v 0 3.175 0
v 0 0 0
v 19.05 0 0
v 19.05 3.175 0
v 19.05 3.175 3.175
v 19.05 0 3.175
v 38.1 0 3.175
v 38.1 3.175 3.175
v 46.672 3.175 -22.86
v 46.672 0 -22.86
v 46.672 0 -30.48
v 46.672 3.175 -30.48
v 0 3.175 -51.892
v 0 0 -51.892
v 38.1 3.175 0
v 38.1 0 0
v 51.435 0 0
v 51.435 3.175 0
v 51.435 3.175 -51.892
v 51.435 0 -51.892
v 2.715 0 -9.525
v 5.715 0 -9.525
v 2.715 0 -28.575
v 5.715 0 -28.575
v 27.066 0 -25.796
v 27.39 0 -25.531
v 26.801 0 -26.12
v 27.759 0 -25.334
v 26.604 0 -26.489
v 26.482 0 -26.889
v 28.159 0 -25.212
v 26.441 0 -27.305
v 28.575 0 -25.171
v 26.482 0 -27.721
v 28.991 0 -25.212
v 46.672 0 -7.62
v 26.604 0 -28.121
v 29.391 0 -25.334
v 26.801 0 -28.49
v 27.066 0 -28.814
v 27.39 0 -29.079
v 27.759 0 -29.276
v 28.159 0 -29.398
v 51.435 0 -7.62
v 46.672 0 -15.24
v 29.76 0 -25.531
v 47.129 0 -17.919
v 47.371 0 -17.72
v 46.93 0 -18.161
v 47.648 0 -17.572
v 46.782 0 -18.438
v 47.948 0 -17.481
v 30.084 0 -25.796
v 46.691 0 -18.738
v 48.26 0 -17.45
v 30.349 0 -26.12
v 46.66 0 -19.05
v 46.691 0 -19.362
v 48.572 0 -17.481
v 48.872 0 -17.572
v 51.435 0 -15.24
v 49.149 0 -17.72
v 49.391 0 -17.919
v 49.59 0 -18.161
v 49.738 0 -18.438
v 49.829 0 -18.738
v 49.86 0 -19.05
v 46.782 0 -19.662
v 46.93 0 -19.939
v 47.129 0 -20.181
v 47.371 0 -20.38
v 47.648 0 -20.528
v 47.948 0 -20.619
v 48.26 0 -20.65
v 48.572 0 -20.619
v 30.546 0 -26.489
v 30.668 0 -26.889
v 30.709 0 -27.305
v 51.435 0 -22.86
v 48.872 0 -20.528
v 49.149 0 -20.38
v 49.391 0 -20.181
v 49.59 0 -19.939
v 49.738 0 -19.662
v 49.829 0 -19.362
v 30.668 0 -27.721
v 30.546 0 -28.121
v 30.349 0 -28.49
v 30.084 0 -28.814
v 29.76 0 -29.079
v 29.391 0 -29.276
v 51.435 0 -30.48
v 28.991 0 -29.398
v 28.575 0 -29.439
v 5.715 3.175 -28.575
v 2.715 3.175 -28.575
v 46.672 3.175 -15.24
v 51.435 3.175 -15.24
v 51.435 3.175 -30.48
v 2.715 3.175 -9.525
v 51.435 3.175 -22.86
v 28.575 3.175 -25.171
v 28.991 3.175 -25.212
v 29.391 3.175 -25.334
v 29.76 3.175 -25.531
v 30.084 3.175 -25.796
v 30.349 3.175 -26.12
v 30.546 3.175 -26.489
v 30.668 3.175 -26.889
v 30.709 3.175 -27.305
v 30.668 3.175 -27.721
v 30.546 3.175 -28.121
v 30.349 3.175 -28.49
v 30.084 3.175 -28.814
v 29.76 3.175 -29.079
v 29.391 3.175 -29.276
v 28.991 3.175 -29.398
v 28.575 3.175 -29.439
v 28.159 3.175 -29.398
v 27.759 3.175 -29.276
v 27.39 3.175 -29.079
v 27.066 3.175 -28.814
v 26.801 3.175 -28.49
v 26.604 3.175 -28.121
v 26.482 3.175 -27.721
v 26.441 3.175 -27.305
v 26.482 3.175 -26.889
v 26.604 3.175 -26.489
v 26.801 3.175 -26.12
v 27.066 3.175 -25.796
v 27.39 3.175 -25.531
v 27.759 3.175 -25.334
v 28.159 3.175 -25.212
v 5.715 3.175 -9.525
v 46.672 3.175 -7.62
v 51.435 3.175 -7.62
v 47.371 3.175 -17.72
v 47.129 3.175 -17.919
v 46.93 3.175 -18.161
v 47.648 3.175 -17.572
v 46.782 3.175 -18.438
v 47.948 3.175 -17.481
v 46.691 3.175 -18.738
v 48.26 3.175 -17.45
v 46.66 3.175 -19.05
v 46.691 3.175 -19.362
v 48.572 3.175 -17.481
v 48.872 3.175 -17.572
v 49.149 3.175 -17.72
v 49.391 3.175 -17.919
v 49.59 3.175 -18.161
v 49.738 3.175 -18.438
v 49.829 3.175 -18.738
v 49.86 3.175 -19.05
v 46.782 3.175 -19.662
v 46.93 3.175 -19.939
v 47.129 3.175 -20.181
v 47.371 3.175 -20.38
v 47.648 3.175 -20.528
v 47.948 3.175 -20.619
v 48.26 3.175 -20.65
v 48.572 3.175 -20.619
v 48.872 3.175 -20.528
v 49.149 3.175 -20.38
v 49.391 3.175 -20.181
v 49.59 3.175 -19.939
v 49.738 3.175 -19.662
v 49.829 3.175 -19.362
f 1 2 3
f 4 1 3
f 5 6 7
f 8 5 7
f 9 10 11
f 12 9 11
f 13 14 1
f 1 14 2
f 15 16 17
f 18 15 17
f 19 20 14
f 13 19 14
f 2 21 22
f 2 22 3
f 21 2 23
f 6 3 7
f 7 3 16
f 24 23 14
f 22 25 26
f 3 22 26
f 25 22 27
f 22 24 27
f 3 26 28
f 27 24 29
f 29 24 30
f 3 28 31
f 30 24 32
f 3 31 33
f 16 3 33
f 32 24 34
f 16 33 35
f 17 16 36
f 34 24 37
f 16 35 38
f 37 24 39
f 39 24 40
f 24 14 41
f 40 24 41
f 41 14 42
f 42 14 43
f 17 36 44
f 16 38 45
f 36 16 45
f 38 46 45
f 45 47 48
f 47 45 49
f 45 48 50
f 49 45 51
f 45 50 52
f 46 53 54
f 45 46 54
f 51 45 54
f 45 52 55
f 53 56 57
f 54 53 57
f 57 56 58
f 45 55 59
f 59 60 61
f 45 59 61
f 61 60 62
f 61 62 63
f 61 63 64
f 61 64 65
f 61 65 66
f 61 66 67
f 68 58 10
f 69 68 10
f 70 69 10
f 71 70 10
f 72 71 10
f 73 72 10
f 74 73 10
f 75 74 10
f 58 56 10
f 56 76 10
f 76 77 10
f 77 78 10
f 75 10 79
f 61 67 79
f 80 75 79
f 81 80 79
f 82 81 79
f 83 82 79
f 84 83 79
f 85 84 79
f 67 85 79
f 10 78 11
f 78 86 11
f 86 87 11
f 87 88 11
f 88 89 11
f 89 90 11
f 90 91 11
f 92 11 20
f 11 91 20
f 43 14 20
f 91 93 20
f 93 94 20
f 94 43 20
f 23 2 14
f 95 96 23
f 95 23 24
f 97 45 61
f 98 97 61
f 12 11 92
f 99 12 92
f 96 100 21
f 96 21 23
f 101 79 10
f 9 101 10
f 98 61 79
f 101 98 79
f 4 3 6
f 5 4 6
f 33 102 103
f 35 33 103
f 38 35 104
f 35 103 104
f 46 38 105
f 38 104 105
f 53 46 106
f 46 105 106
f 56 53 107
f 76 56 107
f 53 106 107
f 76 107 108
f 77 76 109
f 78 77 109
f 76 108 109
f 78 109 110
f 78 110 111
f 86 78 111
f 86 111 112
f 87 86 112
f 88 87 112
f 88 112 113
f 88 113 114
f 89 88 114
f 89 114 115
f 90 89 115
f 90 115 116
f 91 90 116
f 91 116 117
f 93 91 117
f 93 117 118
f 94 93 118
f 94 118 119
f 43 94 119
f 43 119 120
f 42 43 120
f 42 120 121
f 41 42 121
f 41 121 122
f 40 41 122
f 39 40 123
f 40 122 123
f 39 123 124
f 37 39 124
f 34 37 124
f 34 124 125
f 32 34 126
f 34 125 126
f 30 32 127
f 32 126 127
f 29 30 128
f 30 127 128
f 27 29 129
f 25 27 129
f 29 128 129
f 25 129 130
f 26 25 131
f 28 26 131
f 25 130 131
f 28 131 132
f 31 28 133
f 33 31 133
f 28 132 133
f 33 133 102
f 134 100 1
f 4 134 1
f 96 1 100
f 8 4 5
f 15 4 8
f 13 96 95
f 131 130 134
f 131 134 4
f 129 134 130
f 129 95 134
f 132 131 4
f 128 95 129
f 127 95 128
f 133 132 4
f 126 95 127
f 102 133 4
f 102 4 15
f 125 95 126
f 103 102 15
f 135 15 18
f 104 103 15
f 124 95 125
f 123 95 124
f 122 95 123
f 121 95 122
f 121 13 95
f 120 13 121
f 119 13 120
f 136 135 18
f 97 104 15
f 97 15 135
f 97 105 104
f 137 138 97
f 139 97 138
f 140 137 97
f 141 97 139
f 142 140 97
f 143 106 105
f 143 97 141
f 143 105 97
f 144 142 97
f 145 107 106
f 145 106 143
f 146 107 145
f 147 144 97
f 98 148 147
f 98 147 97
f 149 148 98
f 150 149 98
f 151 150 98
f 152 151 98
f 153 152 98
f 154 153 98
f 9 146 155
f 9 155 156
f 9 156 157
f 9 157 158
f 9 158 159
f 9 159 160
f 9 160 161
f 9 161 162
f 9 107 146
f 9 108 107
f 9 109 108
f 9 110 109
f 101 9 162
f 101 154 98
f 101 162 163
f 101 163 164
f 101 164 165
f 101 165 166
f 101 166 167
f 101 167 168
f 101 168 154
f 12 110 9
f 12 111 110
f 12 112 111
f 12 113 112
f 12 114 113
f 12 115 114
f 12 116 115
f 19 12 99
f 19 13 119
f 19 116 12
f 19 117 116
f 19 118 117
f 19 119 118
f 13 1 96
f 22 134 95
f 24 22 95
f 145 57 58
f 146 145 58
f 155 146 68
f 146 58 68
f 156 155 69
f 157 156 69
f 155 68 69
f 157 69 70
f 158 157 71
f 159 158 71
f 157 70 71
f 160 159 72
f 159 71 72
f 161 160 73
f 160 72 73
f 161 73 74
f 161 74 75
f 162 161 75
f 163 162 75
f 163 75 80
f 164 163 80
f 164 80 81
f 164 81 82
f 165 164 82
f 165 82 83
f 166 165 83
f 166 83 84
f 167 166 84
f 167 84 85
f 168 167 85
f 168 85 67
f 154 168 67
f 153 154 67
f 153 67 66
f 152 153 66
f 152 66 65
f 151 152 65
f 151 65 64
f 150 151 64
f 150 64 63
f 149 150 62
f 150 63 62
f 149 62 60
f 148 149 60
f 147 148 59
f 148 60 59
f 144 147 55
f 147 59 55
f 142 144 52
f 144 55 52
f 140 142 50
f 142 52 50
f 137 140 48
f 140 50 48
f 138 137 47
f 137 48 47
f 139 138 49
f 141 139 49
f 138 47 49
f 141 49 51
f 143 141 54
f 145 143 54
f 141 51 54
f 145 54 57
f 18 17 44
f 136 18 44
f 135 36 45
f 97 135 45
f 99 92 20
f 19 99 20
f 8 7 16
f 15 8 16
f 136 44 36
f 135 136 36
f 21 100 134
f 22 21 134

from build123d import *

# Parameters (mm, degrees)
BOSS_EXTRUDE1_DEPTH  = 3.175
M3_CLEARANCE_HOLE1_D = 3.2
SKETCH4_R            = 2.1336
CUT_EXTRUDE1_DEPTH   = 74.133031325
SKETCH5_W            = 3
SKETCH5_H            = 19.05
CUT_EXTRUDE2_DEPTH   = 74.133031325


with BuildPart() as part:
    # Sketch1 → Boss-Extrude1 (new body)
    with BuildSketch(Plane(origin=(0, 0, 0), x_dir=(1, 0, 0), z_dir=(0, 1, 0))):
        Polygon((0, 0), (19.05, 0), (19.05, -3.175), (38.1, -3.175), (38.1, 0), (51.435, 0), (51.435, 7.62), (46.6725, 7.62), (46.6725, 15.24), (51.435, 15.24), (51.435, 22.86), (46.6725, 22.86), (46.6725, 30.48), (51.435, 30.48), (51.435, 51.8922), (0, 51.8922), align=None)
    extrude(amount=BOSS_EXTRUDE1_DEPTH)

    # M3 Clearance Hole1 (through all)
    with Locations(Plane(origin=(0, 3.175, 0), x_dir=(1, 0, 0), z_dir=(0, 1, 0))):
        with Locations((48.26, 19.05)):
            Hole(M3_CLEARANCE_HOLE1_D / 2)

    # Sketch4 → Cut-Extrude1 (cut, through all)
    with BuildSketch(Plane(origin=(0, 3.175, 0), x_dir=(1, 0, 0), z_dir=(0, 1, 0))):
        with Locations(Location((28.575, 27.305, 0), (0, 0, 270))):
            Circle(SKETCH4_R)
    extrude(amount=-CUT_EXTRUDE1_DEPTH, mode=Mode.SUBTRACT)

    # Sketch5 → Cut-Extrude2 (cut, through all)
    with BuildSketch(Plane(origin=(0, 3.175, 0), x_dir=(1, 0, 0), z_dir=(0, 1, 0))):
        with Locations((4.215, 19.05)):
            Rectangle(SKETCH5_W, SKETCH5_H)
    extrude(amount=-CUT_EXTRUDE2_DEPTH, mode=Mode.SUBTRACT)


solid = part.part
